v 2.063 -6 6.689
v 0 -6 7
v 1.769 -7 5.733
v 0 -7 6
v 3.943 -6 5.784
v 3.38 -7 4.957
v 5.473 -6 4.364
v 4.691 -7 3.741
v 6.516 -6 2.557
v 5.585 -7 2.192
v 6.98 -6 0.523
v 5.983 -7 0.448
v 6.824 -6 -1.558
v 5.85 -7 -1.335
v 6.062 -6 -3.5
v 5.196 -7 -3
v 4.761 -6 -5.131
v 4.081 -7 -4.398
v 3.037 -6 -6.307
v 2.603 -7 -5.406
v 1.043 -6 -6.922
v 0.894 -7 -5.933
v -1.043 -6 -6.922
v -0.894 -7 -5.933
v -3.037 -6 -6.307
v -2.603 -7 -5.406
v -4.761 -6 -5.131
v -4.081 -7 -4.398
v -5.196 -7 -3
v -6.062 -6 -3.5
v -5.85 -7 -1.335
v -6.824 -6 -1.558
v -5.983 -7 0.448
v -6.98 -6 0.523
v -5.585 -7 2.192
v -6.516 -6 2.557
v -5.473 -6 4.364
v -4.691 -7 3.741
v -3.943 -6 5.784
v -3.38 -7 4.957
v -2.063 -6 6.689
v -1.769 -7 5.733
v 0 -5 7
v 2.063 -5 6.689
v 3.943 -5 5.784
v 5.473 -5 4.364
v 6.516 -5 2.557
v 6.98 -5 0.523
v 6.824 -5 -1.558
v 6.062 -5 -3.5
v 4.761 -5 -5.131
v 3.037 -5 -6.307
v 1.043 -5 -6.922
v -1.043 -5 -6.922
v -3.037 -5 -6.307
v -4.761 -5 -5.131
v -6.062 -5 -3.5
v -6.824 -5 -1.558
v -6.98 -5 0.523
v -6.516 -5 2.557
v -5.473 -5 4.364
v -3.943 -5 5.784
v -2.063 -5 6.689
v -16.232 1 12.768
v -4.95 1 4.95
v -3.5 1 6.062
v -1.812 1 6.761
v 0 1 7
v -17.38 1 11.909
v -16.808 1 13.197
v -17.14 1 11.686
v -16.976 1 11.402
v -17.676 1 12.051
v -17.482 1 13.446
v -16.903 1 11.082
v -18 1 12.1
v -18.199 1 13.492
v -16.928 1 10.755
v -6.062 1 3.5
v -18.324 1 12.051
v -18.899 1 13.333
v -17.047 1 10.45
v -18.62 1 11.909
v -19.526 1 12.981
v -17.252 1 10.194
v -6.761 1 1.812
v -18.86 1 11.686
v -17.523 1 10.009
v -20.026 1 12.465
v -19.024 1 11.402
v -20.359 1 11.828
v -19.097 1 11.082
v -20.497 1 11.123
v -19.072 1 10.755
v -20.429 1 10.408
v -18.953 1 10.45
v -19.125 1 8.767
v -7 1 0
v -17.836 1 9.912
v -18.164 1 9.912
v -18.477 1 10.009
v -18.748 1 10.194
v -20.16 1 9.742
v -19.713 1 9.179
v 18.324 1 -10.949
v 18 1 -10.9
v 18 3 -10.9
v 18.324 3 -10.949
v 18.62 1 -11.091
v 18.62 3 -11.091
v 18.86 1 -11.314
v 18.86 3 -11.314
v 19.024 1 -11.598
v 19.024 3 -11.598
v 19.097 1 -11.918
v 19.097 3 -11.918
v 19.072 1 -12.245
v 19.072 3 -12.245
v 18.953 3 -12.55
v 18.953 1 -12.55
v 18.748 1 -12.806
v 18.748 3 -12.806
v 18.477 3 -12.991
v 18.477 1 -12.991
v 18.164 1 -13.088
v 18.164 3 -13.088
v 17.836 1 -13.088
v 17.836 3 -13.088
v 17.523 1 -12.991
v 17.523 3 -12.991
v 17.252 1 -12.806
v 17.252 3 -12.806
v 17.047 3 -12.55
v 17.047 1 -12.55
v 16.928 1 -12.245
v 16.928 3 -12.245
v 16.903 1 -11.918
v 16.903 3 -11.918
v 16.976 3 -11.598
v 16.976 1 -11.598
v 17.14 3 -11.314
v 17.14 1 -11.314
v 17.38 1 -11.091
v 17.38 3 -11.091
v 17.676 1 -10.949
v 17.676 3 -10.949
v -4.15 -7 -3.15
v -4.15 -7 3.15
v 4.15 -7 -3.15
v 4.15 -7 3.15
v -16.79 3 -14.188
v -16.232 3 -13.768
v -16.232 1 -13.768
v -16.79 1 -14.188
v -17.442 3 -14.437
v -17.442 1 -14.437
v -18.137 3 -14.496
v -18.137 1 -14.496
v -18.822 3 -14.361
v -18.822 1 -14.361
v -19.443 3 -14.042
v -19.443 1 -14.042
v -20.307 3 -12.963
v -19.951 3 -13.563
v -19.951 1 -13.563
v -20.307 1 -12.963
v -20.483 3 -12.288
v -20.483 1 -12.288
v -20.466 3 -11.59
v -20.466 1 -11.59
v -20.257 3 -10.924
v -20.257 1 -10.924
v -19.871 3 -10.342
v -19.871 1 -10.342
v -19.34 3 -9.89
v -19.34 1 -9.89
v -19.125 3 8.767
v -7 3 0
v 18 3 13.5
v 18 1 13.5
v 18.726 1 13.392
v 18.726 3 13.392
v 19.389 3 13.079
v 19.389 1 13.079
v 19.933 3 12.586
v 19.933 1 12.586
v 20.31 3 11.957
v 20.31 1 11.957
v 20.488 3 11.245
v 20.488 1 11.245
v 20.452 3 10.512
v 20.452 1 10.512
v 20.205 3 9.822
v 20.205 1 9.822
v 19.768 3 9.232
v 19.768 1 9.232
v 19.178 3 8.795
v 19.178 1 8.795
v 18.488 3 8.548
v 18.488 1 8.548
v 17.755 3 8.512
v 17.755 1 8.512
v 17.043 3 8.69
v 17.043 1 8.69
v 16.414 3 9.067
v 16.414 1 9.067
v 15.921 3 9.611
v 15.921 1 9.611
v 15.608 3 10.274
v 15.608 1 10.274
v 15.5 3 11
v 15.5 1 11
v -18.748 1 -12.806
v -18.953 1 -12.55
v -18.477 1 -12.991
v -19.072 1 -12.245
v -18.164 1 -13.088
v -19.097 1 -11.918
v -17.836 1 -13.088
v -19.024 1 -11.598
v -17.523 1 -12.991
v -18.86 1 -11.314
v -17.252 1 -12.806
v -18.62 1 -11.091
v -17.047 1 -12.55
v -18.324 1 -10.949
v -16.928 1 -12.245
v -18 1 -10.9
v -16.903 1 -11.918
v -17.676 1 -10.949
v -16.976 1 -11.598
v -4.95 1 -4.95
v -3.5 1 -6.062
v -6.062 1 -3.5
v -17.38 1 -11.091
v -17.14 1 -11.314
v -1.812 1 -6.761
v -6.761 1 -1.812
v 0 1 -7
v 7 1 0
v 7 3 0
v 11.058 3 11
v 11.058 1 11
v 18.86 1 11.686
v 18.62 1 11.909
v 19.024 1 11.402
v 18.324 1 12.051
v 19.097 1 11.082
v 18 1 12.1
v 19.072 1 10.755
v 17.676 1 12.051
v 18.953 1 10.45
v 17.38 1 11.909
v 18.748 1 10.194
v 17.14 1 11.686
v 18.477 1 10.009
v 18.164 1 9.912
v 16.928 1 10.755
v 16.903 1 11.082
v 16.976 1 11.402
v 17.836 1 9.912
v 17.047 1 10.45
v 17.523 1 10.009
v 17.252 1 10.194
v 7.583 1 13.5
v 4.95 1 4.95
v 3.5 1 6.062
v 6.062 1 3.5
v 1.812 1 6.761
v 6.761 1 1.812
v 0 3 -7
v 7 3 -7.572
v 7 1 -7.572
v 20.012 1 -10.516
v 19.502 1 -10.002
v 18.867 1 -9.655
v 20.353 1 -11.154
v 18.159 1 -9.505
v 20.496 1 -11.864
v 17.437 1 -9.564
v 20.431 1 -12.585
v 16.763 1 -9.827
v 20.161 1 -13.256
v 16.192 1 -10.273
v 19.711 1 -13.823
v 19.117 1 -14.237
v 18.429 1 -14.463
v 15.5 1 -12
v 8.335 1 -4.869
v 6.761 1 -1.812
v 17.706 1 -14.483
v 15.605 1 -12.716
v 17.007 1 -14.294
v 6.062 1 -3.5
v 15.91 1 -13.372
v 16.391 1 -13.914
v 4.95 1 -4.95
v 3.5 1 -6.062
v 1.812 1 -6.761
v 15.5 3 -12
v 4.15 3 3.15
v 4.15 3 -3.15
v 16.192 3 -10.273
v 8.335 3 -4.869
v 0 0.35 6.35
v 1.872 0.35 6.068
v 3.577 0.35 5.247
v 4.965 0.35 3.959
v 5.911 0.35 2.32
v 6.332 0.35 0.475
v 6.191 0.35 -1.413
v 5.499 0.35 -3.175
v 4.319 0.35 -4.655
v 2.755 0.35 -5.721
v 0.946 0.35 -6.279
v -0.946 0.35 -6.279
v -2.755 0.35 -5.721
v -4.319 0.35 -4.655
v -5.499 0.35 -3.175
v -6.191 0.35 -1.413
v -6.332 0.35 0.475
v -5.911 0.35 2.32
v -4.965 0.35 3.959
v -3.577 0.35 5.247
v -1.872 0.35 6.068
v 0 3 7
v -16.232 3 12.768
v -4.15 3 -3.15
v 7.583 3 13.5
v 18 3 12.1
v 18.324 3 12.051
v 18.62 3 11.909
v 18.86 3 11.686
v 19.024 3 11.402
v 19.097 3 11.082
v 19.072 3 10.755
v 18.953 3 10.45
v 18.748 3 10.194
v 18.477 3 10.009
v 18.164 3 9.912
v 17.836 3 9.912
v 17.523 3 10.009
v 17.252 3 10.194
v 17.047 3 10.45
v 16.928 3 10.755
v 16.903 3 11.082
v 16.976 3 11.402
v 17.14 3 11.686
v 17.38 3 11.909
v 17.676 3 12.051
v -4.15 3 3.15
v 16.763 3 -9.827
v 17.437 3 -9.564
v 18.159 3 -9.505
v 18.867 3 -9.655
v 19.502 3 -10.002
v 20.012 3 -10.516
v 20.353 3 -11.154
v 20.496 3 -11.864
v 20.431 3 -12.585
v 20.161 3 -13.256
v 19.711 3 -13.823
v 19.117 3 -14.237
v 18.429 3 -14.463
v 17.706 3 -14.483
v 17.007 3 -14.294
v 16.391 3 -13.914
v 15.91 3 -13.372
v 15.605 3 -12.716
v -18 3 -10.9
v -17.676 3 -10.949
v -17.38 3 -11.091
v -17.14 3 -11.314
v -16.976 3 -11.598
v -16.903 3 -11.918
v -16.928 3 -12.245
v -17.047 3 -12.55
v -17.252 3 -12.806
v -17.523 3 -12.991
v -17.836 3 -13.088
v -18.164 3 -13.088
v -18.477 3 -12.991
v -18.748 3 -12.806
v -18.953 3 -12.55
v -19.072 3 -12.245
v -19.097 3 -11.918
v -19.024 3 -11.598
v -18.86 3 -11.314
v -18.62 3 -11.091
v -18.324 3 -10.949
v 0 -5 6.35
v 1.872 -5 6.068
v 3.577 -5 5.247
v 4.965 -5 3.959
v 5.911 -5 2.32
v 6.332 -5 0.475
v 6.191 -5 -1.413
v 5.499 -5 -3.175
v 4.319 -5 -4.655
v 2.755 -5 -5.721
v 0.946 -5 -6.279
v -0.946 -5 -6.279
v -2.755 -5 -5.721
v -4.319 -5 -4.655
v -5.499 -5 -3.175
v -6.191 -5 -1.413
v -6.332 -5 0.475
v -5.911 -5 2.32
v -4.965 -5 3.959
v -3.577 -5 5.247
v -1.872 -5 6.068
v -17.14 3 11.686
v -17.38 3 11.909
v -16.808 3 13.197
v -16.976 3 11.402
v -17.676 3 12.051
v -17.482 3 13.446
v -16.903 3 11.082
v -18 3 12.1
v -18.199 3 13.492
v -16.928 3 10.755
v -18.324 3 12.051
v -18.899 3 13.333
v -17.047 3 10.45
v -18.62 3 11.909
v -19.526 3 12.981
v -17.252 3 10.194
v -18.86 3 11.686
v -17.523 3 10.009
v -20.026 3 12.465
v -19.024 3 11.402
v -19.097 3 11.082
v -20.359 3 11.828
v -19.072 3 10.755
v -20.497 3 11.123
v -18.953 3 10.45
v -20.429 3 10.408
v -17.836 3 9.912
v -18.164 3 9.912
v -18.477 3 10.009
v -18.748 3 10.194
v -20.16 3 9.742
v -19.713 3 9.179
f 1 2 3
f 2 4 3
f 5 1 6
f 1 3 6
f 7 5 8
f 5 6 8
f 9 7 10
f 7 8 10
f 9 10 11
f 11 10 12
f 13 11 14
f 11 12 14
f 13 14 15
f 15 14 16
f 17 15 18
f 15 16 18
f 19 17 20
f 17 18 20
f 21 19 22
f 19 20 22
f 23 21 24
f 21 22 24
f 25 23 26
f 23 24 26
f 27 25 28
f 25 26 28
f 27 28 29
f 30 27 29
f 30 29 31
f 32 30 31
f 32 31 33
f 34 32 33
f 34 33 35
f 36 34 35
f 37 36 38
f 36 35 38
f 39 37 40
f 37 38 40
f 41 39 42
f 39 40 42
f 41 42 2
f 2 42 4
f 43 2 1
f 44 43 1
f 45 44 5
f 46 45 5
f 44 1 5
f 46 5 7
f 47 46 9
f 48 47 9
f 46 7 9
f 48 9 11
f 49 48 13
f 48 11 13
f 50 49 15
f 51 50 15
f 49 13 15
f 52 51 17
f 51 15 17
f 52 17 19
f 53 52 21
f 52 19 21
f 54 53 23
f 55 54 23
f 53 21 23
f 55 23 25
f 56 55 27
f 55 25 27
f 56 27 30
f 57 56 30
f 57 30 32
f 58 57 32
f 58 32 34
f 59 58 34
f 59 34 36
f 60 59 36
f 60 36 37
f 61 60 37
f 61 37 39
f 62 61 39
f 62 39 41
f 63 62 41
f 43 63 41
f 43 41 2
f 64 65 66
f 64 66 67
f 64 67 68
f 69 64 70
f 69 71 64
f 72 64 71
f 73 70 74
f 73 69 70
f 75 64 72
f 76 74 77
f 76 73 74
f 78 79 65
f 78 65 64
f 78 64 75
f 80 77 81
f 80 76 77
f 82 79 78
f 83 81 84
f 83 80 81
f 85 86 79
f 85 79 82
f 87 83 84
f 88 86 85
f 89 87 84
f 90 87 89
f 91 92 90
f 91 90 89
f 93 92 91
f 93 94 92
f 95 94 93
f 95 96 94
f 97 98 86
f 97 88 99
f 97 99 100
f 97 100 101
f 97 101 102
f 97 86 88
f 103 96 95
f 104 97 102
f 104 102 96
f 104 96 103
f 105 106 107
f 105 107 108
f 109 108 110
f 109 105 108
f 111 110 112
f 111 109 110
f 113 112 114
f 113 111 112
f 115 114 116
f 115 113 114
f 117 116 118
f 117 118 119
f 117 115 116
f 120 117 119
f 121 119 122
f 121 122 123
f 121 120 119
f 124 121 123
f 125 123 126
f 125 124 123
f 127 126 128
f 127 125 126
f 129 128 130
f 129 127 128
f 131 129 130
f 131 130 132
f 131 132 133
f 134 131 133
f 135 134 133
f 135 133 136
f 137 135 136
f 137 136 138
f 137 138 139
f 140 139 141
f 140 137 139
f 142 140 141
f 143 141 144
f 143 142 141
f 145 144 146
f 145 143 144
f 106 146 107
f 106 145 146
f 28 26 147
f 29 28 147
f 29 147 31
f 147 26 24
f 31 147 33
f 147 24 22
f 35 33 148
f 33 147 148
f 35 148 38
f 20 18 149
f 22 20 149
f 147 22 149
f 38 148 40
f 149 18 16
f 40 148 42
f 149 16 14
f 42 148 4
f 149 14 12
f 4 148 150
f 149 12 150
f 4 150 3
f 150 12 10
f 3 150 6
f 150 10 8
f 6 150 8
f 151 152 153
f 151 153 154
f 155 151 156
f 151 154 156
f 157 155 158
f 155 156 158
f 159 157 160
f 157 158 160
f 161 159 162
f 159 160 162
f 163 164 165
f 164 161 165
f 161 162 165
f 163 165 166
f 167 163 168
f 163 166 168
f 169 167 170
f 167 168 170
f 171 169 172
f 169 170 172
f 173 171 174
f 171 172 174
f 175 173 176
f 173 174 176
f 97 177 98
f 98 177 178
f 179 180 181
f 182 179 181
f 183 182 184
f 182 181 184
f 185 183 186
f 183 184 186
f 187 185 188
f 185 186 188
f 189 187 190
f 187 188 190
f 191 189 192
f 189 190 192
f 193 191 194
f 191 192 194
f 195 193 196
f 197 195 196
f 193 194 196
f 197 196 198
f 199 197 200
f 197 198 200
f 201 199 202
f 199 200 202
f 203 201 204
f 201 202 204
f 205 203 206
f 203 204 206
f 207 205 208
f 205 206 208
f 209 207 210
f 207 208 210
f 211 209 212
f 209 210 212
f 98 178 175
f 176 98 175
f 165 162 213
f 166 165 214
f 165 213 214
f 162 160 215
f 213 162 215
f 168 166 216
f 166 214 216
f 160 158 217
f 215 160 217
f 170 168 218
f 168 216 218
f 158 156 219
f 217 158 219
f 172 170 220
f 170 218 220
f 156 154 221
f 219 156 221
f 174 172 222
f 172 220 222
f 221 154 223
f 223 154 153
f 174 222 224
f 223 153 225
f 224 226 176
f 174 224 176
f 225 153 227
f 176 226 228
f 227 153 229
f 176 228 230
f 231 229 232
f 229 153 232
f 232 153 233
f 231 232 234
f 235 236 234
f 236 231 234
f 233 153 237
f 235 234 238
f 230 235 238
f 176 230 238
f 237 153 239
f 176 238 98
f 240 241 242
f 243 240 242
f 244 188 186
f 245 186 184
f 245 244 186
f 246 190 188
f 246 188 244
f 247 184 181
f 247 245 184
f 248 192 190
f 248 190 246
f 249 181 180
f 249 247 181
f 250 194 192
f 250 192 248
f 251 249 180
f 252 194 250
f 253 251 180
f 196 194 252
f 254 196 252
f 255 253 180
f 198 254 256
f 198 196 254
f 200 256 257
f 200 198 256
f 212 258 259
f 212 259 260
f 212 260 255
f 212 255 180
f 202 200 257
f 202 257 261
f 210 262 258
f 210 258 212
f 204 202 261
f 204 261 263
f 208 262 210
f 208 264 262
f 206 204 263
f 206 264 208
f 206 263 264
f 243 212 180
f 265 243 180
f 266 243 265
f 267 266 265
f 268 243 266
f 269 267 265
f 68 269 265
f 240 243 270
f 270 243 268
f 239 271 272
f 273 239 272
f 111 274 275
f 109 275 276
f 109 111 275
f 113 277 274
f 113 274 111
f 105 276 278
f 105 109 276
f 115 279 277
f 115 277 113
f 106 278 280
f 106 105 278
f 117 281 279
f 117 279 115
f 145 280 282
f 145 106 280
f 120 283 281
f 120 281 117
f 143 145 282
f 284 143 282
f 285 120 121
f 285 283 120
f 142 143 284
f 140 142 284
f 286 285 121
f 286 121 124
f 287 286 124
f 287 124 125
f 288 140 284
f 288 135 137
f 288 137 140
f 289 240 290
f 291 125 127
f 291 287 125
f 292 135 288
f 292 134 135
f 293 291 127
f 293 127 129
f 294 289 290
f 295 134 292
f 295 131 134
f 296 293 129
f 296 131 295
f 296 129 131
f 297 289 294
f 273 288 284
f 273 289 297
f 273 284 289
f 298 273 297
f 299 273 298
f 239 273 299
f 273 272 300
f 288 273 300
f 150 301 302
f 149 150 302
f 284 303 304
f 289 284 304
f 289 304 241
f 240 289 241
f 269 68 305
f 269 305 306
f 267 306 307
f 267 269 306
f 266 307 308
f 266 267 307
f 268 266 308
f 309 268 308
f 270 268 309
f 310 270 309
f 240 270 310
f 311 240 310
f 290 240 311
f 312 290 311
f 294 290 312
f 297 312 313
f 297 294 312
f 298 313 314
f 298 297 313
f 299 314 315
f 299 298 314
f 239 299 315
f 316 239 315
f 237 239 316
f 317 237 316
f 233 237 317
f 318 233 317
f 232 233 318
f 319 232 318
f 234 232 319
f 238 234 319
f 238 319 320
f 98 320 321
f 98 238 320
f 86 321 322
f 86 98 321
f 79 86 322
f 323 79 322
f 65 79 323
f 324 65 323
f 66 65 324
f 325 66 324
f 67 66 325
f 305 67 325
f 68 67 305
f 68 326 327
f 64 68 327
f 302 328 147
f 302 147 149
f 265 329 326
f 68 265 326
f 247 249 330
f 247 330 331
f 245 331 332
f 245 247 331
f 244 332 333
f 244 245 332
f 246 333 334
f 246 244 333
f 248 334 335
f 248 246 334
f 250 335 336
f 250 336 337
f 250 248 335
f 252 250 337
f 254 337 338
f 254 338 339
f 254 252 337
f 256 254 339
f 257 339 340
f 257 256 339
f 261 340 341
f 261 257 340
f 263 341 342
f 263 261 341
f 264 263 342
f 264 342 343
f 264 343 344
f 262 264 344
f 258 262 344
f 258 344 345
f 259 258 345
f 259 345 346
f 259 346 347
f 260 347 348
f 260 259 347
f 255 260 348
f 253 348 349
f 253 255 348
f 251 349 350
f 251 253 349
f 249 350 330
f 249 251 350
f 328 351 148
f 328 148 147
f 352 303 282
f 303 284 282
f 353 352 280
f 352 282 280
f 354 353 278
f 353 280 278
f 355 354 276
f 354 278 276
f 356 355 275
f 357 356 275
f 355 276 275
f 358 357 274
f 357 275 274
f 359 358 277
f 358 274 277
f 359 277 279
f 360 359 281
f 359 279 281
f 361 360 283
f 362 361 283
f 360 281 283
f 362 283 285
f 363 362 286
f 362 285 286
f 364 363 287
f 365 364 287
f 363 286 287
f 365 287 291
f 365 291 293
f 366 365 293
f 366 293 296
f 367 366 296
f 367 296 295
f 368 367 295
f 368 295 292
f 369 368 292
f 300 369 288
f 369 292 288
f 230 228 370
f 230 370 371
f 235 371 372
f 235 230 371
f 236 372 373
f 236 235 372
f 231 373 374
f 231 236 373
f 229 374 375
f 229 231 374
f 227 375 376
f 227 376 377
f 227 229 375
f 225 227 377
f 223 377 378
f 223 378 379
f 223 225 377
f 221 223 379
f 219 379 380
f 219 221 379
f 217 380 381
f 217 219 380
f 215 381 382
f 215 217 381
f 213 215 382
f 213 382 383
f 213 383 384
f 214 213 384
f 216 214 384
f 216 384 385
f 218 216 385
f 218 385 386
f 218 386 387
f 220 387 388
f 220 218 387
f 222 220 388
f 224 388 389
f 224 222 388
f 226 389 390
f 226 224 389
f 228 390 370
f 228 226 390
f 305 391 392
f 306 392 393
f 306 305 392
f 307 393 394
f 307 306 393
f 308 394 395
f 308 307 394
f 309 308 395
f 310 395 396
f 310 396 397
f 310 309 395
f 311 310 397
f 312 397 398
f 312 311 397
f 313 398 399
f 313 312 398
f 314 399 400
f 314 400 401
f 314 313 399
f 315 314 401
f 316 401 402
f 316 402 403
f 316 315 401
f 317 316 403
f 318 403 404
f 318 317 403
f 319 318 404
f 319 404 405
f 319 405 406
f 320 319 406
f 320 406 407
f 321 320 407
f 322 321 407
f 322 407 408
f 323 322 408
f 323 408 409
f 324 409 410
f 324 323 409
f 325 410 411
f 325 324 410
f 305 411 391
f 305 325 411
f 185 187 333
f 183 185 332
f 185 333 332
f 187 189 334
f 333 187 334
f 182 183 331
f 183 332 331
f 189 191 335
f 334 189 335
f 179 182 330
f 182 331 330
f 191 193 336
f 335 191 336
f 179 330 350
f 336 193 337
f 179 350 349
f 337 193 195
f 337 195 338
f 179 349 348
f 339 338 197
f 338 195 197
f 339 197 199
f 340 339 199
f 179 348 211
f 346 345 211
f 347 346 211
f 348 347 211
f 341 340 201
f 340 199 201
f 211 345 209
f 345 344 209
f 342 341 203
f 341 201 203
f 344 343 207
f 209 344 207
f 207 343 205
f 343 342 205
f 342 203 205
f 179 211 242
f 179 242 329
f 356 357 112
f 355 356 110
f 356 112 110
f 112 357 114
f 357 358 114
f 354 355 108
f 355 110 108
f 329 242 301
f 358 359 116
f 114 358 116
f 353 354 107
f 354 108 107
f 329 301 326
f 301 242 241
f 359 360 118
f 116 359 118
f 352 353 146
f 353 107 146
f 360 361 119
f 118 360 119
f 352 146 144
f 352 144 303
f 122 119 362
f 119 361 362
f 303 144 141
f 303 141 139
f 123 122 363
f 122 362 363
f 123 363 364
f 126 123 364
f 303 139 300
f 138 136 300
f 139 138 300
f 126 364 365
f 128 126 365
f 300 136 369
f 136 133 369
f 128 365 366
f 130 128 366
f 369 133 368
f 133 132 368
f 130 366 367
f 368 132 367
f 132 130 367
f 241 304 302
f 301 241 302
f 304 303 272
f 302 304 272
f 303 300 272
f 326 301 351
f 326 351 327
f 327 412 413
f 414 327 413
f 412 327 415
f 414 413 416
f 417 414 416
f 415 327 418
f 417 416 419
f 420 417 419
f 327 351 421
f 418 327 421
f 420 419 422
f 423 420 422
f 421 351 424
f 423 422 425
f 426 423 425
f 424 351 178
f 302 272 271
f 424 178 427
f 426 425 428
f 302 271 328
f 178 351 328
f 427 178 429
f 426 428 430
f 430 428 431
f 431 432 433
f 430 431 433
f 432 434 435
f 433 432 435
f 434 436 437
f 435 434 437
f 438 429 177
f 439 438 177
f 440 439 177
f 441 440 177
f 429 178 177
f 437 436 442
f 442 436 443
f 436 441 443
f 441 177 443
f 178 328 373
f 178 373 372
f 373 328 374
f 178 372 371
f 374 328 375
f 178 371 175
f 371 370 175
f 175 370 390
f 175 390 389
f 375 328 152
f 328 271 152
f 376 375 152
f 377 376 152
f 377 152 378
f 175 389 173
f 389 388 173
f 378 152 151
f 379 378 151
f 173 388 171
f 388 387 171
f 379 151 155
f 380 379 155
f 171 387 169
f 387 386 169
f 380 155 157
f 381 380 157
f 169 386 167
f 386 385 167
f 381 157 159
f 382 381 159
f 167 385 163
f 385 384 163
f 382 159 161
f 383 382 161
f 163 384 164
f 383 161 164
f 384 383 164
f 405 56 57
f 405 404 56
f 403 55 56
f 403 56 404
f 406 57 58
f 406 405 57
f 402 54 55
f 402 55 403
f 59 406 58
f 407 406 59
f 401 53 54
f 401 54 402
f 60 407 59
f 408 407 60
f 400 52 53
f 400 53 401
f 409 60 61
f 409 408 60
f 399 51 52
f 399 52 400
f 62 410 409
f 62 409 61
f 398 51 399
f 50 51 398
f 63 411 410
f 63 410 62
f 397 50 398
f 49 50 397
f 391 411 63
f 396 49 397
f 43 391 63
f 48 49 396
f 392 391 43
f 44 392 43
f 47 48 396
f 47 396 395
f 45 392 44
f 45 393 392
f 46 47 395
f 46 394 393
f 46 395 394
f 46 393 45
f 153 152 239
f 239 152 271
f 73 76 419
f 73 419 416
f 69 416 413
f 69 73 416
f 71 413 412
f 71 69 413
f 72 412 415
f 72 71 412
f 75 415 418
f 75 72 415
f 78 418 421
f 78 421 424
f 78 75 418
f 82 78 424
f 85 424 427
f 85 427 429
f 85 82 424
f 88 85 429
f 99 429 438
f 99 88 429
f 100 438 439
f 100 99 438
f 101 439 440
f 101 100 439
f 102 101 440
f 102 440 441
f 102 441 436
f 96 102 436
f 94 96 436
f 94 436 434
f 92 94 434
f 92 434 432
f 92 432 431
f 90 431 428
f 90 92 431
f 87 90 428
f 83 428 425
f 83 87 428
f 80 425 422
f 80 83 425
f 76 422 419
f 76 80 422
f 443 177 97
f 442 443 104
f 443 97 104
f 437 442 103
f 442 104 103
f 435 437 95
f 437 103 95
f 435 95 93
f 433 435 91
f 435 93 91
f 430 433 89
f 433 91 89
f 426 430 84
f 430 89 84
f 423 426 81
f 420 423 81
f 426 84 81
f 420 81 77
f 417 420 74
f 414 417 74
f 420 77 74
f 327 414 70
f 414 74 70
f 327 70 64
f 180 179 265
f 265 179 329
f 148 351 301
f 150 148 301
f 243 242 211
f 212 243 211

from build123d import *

# Parameters (mm, degrees)
SKETCH1_R                  = 6.35
BOSS_EXTRUDE1_DEPTH        = 5
SKETCH2_R                  = 7
BOSS_EXTRUDE2_DEPTH        = 2
BOSS_EXTRUDE3_START        = -7
SKETCH2_2_R                = 7
BOSS_EXTRUDE3_DEPTH        = 2
CHAMFER1_SIZE              = 1
SKETCH3_W                  = 8.3
SKETCH3_H                  = 6.3
CUT_EXTRUDE1_DEPTH         = 14.37908816
BOSS_EXTRUDE4_DEPTH        = 1
BOSS_EXTRUDE4_DEPTH_BACK   = 1
SKETCH6_R                  = 2.5
SKETCH6_R_2                = 1.1
BOSS_EXTRUDE4_2_DEPTH      = 1
BOSS_EXTRUDE4_2_DEPTH_BACK = 1
BOSS_EXTRUDE4_3_DEPTH      = 1
BOSS_EXTRUDE4_3_DEPTH_BACK = 1
BOSS_EXTRUDE4_4_DEPTH      = 1
BOSS_EXTRUDE4_4_DEPTH_BACK = 1
SKETCH7_W                  = 8.3
SKETCH7_H                  = 6.3
BOSS_EXTRUDE5_DEPTH        = 2


with BuildPart() as part:
    # Sketch1 → Boss-Extrude1 (new body)
    with BuildSketch(Plane(origin=(0, 0, 0), x_dir=(1, 0, 0), z_dir=(0, 1, 0))):
        with Locations(Location((0, 0, 0), (0, 0, 270))):
            Circle(SKETCH1_R)
    extrude(amount=-BOSS_EXTRUDE1_DEPTH)

    # Sketch2 → Boss-Extrude2 (add)
    with BuildSketch(Plane(origin=(0, 0, 0), x_dir=(1, 0, 0), z_dir=(0, 1, 0))):
        with Locations(Location((0, 0, 0), (0, 0, 270))):
            Circle(SKETCH2_R)
    extrude(amount=BOSS_EXTRUDE2_DEPTH)

    # Sketch2<2> → Boss-Extrude3 (add)
    with BuildSketch(Plane(origin=(0, 0, 0), x_dir=(1, 0, 0), z_dir=(0, 1, 0)).offset(BOSS_EXTRUDE3_START)):
        with Locations(Location((0, 0, 0), (0, 0, 270))):
            Circle(SKETCH2_2_R)
    extrude(amount=BOSS_EXTRUDE3_DEPTH)

    # Chamfer1
    # the kernel refuses this chamfer: 1 mm, written as the material it takes off along each edge
    with BuildSketch(Plane(origin=(0, 0, 0), x_dir=(0, 0, 1), z_dir=(-1, 0, 0))) as chamfer1_piece_1_section:
        Polygon((7 - CHAMFER1_SIZE, 0), (7, CHAMFER1_SIZE), (7, 0), align=None)
    chamfer1_piece_1 = revolve(axis=Axis((0, 0, 0), (0, 1, 0)), mode=Mode.PRIVATE)
    chamfer1_piece_1 = chamfer1_piece_1 - Plane(origin=(0, 0.669896582, 0), x_dir=(0, 0, 1), z_dir=(0, 1, 0)) * Cylinder(6.35, 28, mode=Mode.PRIVATE)
    add(chamfer1_piece_1, mode=Mode.SUBTRACT)
    with BuildSketch(Plane(origin=(0, -7, 0), x_dir=(0, 0, 1), z_dir=(-1, 0, 0))) as chamfer1_piece_2:
        Polygon((7, CHAMFER1_SIZE), (7 - CHAMFER1_SIZE, 0), (7, 0), align=None)
    revolve(axis=Axis((0, -7, 0), (0, 1, 0)), mode=Mode.SUBTRACT)

    # Sketch3 → Cut-Extrude1 (cut, through all)
    with BuildSketch(Plane.XZ.offset(7)):
        Rectangle(SKETCH3_W, SKETCH3_H)
    extrude(amount=-CUT_EXTRUDE1_DEPTH, mode=Mode.SUBTRACT)



with BuildPart() as body_2:
    # Sketch6 → Boss-Extrude4 (new, two sides: drawn at the far end of the back side and taken through both)
    with BuildSketch(Plane(origin=(0, 2, 0), x_dir=(1, 0, 0), z_dir=(0, 1, 0)).offset(-BOSS_EXTRUDE4_DEPTH_BACK)):
        with Locations(Location((-18, -11, 0), (0, 0, 270))):
            Circle(SKETCH6_R)
        with Locations(Location((-18, -11, 0), (0, 0, 270))):
            Circle(SKETCH6_R_2, mode=Mode.SUBTRACT)
    extrude(amount=BOSS_EXTRUDE4_DEPTH + BOSS_EXTRUDE4_DEPTH_BACK)


with BuildPart() as body_3:
    # Sketch6 → Boss-Extrude4 2 (new, two sides: drawn at the far end of the back side and taken through both)
    with BuildSketch(Plane(origin=(0, 2, 0), x_dir=(1, 0, 0), z_dir=(0, 1, 0)).offset(-BOSS_EXTRUDE4_2_DEPTH_BACK)):
        with Locations(Location((18, -11, 0), (0, 0, 270))):
            Circle(SKETCH6_R)
        with Locations(Location((18, -11, 0), (0, 0, 270))):
            Circle(SKETCH6_R_2, mode=Mode.SUBTRACT)
    extrude(amount=BOSS_EXTRUDE4_2_DEPTH + BOSS_EXTRUDE4_2_DEPTH_BACK)


with BuildPart() as body_4:
    # Sketch6 → Boss-Extrude4 3 (new, two sides: drawn at the far end of the back side and taken through both)
    with BuildSketch(Plane(origin=(0, 2, 0), x_dir=(1, 0, 0), z_dir=(0, 1, 0)).offset(-BOSS_EXTRUDE4_3_DEPTH_BACK)):
        with Locations(Location((18, 12, 0), (0, 0, 270))):
            Circle(SKETCH6_R)
        with Locations(Location((18, 12, 0), (0, 0, 270))):
            Circle(SKETCH6_R_2, mode=Mode.SUBTRACT)
    extrude(amount=BOSS_EXTRUDE4_3_DEPTH + BOSS_EXTRUDE4_3_DEPTH_BACK)


with BuildPart() as body_5:
    # Sketch6 → Boss-Extrude4 4 (new, two sides: drawn at the far end of the back side and taken through both)
    with BuildSketch(Plane(origin=(0, 2, 0), x_dir=(1, 0, 0), z_dir=(0, 1, 0)).offset(-BOSS_EXTRUDE4_4_DEPTH_BACK)):
        with Locations(Location((-18, 12, 0), (0, 0, 270))):
            Circle(SKETCH6_R)
        with Locations(Location((-18, 12, 0), (0, 0, 270))):
            Circle(SKETCH6_R_2, mode=Mode.SUBTRACT)
    extrude(amount=BOSS_EXTRUDE4_4_DEPTH + BOSS_EXTRUDE4_4_DEPTH_BACK)


with BuildPart() as part_1:
    add(part.part)

    add(body_2.part)  # Boss-Extrude5 merges body 2

    add(body_3.part)  # Boss-Extrude5 merges body 3

    add(body_4.part)  # Boss-Extrude5 merges body 4

    add(body_5.part)  # Boss-Extrude5 merges body 5
    # Sketch7 → Boss-Extrude5 (add)
    with BuildSketch(Plane(origin=(0, 3, 0), x_dir=(1, 0, 0), z_dir=(0, 1, 0))):
        Polygon((-19.767766953, 10.232233047), (-16.232233047, 10.232233047), (-16.232233047, 13.767766953), (0, 7), (7, 7.572180743), (15.5, 12), (16.192434296, 10.272948691), (8.334514261, 4.869137674), (7, 0), (11.058001897, -11), (15.5, -11), (18, -13.5), (7.583003583, -13.5), (0, -7), (-16.232233047, -12.767766953), (-16.232233047, -9.232233047), (-19.767766953, -9.232233047), (-7, 0), align=None)
        Rectangle(SKETCH7_W, SKETCH7_H, mode=Mode.SUBTRACT)
    extrude(amount=-BOSS_EXTRUDE5_DEPTH)


solid = part_1.part
